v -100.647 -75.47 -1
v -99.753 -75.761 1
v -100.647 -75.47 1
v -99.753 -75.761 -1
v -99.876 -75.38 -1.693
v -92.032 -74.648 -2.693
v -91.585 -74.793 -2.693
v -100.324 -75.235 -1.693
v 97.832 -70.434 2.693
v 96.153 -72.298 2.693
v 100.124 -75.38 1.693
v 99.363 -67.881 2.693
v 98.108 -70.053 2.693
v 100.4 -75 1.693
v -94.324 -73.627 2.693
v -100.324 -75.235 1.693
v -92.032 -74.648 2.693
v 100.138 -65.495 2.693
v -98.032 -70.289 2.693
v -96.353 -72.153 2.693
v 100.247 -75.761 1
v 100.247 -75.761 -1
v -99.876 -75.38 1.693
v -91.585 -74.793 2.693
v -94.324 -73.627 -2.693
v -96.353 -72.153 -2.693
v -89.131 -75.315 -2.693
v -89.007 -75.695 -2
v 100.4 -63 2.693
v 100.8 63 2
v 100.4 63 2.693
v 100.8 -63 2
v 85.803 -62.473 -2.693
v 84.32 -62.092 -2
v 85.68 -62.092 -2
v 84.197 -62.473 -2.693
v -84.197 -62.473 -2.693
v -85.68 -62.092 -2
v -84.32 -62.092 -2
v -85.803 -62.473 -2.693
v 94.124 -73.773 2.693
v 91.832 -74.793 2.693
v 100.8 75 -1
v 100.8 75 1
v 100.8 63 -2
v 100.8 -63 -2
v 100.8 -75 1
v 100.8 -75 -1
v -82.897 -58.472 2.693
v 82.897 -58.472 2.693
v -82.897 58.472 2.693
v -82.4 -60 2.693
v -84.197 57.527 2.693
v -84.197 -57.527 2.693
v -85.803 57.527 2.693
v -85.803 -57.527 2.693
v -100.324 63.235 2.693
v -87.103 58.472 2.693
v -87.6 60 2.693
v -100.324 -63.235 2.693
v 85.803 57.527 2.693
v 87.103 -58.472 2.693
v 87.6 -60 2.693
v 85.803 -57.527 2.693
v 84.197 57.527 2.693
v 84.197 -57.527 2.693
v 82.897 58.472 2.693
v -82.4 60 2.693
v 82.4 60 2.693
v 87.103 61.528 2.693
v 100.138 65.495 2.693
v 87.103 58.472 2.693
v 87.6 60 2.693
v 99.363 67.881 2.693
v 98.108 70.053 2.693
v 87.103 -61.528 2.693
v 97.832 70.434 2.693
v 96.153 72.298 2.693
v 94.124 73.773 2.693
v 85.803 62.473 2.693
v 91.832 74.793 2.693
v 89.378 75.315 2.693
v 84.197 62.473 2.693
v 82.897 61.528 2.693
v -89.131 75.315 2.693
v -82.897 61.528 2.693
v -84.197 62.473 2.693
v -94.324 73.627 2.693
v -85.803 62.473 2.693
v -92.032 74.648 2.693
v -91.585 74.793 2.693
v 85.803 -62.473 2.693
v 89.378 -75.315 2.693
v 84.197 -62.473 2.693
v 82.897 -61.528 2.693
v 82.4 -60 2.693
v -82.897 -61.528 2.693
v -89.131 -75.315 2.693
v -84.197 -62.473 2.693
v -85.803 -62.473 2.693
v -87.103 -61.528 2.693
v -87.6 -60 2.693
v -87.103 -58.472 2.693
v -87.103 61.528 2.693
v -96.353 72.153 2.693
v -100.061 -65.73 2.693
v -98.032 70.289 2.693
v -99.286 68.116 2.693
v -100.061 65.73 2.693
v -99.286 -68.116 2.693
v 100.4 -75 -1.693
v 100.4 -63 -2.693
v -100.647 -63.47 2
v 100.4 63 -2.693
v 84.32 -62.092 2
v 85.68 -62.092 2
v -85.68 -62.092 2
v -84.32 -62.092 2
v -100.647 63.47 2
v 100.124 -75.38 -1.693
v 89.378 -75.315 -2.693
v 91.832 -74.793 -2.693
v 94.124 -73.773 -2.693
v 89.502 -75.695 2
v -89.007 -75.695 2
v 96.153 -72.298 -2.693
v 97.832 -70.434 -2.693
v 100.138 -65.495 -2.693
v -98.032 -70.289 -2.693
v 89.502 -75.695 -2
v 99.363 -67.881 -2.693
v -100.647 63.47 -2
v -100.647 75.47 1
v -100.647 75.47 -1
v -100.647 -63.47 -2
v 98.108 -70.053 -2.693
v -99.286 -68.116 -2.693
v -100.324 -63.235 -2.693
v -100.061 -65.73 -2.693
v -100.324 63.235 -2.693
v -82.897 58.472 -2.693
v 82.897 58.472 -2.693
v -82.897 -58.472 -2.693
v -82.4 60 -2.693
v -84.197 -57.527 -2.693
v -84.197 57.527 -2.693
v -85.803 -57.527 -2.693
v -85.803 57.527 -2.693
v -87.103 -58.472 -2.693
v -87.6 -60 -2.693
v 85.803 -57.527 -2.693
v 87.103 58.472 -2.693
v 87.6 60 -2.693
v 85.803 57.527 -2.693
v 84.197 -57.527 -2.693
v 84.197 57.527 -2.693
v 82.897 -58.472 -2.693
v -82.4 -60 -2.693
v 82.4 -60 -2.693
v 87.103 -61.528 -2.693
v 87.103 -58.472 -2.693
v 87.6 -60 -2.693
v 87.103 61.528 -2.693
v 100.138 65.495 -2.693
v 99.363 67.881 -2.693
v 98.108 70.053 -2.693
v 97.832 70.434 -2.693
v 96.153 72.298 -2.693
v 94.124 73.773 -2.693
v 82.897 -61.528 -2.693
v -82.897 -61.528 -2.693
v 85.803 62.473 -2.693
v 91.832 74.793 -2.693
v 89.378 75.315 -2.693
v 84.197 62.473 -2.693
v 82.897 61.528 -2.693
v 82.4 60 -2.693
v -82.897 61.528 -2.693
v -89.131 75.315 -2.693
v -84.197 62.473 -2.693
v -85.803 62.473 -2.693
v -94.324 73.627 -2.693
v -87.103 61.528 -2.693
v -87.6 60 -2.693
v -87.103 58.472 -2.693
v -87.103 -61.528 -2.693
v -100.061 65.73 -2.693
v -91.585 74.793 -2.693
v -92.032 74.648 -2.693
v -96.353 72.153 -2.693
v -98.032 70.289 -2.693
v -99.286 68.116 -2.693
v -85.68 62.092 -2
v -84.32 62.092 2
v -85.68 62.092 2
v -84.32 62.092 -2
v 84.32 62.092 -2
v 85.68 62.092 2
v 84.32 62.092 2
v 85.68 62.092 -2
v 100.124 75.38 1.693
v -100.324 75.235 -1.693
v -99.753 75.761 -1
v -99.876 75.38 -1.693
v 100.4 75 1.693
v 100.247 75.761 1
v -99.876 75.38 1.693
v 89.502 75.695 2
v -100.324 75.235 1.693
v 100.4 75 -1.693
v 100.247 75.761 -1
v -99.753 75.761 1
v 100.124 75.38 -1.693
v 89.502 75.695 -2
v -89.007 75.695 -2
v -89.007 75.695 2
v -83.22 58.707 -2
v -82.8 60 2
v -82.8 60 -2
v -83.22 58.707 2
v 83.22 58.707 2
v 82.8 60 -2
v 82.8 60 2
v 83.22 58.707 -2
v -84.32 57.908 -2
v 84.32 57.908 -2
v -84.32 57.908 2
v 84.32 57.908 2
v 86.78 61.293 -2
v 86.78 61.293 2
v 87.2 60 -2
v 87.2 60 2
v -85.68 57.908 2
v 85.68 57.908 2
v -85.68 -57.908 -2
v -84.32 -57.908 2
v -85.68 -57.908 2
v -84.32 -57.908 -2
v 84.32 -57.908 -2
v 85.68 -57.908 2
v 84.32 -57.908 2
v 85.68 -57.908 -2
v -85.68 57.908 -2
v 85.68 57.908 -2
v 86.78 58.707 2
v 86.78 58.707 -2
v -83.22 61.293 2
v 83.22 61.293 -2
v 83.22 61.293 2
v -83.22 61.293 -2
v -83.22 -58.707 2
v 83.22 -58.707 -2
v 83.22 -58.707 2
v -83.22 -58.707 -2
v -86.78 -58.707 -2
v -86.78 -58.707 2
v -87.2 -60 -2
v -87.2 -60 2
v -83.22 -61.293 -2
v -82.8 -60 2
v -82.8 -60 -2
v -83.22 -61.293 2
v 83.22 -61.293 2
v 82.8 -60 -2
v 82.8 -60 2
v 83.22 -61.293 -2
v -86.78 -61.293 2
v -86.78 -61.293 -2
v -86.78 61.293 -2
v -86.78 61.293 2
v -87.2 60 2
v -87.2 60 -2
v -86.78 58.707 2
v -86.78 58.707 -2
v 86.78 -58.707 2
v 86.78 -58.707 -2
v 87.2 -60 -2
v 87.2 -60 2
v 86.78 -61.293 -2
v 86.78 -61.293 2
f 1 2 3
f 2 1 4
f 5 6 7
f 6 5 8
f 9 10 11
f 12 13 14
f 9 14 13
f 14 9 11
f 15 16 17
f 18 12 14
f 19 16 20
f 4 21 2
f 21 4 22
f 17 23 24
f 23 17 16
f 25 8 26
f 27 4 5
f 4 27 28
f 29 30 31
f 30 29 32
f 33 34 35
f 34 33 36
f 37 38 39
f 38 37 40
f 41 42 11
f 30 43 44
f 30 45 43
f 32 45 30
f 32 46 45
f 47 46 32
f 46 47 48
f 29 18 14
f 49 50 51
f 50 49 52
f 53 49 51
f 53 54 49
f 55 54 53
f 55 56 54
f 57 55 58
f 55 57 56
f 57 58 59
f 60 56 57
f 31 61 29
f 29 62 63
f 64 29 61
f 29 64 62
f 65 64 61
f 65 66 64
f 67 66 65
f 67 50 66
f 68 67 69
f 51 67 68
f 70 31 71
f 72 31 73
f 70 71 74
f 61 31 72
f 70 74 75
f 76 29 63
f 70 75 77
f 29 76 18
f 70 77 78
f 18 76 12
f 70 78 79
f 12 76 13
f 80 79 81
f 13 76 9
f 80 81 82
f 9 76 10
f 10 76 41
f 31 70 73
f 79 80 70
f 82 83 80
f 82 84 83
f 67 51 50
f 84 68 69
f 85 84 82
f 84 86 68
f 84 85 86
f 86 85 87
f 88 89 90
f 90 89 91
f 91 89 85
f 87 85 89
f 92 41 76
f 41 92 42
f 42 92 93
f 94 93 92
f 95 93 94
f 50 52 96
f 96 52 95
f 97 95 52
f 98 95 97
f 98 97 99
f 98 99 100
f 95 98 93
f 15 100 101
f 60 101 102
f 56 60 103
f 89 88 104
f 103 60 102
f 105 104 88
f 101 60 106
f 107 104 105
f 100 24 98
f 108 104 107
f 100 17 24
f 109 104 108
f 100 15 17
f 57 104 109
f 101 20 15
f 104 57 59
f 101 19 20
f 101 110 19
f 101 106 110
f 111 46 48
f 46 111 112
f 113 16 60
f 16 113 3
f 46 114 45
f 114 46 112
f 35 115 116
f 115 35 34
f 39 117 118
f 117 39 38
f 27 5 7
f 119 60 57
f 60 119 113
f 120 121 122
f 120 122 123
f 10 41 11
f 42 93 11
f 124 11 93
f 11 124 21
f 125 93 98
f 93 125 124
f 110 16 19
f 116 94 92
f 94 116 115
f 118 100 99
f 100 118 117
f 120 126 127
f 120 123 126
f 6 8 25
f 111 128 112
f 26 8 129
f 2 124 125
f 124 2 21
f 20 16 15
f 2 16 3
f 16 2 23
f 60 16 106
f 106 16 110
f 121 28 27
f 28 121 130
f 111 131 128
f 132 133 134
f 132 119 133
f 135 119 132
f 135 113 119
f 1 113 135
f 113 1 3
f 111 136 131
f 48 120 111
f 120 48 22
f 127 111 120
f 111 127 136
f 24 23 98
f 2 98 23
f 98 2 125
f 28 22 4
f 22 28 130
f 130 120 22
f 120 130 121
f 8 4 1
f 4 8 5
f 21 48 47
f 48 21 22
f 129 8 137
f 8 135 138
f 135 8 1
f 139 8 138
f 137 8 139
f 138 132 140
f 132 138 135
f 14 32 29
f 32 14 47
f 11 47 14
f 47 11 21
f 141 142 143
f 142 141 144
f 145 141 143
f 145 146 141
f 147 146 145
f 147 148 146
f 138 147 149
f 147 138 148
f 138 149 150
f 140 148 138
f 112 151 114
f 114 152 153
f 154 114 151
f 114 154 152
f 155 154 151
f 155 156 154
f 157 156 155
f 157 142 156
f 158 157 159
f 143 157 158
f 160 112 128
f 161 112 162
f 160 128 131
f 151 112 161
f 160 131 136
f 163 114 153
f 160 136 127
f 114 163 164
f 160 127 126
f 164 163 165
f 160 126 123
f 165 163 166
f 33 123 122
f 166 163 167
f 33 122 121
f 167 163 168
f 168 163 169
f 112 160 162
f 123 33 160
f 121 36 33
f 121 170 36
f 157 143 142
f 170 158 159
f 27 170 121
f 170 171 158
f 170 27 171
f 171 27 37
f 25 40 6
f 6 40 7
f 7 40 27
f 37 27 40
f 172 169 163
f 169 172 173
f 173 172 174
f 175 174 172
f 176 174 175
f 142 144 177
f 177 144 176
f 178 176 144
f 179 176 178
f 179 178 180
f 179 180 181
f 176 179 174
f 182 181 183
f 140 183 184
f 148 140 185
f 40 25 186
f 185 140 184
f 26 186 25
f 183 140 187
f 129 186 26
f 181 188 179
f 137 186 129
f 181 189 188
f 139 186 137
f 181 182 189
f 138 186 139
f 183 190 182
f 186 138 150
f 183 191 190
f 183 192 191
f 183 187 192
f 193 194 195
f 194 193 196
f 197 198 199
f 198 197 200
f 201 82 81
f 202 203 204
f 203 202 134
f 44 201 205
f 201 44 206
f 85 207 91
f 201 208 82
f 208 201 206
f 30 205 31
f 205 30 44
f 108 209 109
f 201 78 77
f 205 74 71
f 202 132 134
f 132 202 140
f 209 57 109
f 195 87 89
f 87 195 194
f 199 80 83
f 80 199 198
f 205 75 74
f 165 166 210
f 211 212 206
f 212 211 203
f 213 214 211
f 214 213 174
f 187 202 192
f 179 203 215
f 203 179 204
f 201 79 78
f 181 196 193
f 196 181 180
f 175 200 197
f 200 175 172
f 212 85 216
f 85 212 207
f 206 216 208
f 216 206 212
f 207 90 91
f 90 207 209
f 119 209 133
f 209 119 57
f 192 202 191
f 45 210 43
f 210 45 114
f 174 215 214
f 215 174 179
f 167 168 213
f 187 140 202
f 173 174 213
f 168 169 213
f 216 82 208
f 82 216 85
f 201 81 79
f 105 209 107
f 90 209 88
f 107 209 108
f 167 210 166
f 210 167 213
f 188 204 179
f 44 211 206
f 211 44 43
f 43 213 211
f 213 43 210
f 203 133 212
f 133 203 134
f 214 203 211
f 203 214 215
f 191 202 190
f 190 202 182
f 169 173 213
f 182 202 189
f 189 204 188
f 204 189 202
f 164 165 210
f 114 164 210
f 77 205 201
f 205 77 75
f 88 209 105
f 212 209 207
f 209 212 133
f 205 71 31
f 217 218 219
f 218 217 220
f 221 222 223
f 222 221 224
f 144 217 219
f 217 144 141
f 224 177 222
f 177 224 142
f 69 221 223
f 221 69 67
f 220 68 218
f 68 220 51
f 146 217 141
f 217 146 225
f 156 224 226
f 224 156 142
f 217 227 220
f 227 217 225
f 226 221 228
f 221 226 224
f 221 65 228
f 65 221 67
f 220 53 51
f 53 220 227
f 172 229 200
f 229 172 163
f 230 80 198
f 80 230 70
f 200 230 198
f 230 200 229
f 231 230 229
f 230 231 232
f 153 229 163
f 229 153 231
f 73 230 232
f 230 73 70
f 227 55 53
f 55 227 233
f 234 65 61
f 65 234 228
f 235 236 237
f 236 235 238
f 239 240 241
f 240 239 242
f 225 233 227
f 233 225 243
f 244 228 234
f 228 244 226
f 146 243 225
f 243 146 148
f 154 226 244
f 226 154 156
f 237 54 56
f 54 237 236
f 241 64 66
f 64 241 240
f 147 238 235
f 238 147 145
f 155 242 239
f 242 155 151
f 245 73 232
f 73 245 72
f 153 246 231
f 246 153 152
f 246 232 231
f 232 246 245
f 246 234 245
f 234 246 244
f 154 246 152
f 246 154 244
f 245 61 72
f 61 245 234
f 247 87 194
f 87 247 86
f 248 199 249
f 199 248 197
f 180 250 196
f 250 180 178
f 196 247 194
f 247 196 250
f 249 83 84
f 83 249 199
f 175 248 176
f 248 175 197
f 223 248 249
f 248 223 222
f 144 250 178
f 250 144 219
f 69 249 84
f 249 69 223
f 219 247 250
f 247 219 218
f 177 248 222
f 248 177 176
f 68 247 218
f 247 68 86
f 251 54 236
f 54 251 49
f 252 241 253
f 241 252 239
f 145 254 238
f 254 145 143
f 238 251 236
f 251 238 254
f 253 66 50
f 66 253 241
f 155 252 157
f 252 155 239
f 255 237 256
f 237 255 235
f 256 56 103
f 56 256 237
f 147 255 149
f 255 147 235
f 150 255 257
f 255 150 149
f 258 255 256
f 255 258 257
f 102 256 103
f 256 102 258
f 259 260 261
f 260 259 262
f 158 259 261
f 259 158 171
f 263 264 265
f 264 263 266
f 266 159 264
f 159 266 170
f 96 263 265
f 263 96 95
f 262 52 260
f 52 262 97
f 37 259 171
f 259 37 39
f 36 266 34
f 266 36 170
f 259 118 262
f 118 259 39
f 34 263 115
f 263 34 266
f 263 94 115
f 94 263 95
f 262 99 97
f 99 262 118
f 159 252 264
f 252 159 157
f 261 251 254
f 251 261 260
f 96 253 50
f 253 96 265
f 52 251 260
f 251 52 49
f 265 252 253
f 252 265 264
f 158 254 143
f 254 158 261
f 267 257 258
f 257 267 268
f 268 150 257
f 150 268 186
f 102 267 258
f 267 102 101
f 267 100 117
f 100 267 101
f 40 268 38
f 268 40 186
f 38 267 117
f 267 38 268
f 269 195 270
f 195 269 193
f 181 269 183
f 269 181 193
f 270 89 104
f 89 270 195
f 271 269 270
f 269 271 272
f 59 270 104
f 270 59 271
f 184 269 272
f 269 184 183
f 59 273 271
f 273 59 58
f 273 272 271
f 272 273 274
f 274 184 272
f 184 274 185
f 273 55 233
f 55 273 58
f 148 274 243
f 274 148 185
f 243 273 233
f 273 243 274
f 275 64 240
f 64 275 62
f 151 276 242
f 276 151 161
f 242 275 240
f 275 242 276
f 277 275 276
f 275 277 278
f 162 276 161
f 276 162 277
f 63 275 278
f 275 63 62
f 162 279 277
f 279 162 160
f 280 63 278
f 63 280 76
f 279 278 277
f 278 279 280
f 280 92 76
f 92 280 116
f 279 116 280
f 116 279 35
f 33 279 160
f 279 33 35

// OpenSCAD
// Parameters
sheet_length = 200; //[100:400:1]
sheet_width = 150; //[75:300:1]
sheet_thickness = 2; //[1:6:0.5]
corner_radius = 12; //[6:24:1]
hole_diameter = 6; //[3:12:0.5]
hole_edge_offset = 15; //[8:30:1]
chamfer_size = 0.8; //[0.3:2:0.1]
overlap = 1; //[0.5:2:0.1]

// Base shapes
module sheet_body() {
  translate([0, 0, 0])
    cube([sheet_length, sheet_width, sheet_thickness], center=true);
}

module rounded_corner(pos) {
  translate(pos)
    cylinder(r=corner_radius, h=sheet_thickness + 2*overlap, center=true);
}

module mounting_hole(pos) {
  translate(pos)
    cylinder(r=hole_diameter/2, h=sheet_thickness + 2*overlap, center=true);
}

module chamfer_kernel() {
  sphere(r=chamfer_size, center=true);
}

// Operations
module rounded_corners_union() {
  union() {
    rounded_corner([sheet_length/2 - corner_radius, sheet_width/2 - corner_radius, 0]);
    rounded_corner([-(sheet_length/2 - corner_radius), sheet_width/2 - corner_radius, 0]);
    rounded_corner([-(sheet_length/2 - corner_radius), -(sheet_width/2 - corner_radius), 0]);
    rounded_corner([sheet_length/2 - corner_radius, -(sheet_width/2 - corner_radius), 0]);
  }
}

module sheet_with_rounded_corners() {
  hull() {
    sheet_body();
    rounded_corners_union();
  }
}

module mounting_holes_union() {
  union() {
    mounting_hole([sheet_length/2 - hole_edge_offset, sheet_width/2 - hole_edge_offset, 0]);
    mounting_hole([-(sheet_length/2 - hole_edge_offset), sheet_width/2 - hole_edge_offset, 0]);
    mounting_hole([-(sheet_length/2 - hole_edge_offset), -(sheet_width/2 - hole_edge_offset), 0]);
    mounting_hole([sheet_length/2 - hole_edge_offset, -(sheet_width/2 - hole_edge_offset), 0]);
  }
}

module sheet_minus_holes() {
  difference() {
    sheet_with_rounded_corners();
    mounting_holes_union();
  }
}

module chamfer_edges() {
  minkowski() {
    sheet_minus_holes();
    chamfer_kernel();
  }
}

// Final output
chamfer_edges();
